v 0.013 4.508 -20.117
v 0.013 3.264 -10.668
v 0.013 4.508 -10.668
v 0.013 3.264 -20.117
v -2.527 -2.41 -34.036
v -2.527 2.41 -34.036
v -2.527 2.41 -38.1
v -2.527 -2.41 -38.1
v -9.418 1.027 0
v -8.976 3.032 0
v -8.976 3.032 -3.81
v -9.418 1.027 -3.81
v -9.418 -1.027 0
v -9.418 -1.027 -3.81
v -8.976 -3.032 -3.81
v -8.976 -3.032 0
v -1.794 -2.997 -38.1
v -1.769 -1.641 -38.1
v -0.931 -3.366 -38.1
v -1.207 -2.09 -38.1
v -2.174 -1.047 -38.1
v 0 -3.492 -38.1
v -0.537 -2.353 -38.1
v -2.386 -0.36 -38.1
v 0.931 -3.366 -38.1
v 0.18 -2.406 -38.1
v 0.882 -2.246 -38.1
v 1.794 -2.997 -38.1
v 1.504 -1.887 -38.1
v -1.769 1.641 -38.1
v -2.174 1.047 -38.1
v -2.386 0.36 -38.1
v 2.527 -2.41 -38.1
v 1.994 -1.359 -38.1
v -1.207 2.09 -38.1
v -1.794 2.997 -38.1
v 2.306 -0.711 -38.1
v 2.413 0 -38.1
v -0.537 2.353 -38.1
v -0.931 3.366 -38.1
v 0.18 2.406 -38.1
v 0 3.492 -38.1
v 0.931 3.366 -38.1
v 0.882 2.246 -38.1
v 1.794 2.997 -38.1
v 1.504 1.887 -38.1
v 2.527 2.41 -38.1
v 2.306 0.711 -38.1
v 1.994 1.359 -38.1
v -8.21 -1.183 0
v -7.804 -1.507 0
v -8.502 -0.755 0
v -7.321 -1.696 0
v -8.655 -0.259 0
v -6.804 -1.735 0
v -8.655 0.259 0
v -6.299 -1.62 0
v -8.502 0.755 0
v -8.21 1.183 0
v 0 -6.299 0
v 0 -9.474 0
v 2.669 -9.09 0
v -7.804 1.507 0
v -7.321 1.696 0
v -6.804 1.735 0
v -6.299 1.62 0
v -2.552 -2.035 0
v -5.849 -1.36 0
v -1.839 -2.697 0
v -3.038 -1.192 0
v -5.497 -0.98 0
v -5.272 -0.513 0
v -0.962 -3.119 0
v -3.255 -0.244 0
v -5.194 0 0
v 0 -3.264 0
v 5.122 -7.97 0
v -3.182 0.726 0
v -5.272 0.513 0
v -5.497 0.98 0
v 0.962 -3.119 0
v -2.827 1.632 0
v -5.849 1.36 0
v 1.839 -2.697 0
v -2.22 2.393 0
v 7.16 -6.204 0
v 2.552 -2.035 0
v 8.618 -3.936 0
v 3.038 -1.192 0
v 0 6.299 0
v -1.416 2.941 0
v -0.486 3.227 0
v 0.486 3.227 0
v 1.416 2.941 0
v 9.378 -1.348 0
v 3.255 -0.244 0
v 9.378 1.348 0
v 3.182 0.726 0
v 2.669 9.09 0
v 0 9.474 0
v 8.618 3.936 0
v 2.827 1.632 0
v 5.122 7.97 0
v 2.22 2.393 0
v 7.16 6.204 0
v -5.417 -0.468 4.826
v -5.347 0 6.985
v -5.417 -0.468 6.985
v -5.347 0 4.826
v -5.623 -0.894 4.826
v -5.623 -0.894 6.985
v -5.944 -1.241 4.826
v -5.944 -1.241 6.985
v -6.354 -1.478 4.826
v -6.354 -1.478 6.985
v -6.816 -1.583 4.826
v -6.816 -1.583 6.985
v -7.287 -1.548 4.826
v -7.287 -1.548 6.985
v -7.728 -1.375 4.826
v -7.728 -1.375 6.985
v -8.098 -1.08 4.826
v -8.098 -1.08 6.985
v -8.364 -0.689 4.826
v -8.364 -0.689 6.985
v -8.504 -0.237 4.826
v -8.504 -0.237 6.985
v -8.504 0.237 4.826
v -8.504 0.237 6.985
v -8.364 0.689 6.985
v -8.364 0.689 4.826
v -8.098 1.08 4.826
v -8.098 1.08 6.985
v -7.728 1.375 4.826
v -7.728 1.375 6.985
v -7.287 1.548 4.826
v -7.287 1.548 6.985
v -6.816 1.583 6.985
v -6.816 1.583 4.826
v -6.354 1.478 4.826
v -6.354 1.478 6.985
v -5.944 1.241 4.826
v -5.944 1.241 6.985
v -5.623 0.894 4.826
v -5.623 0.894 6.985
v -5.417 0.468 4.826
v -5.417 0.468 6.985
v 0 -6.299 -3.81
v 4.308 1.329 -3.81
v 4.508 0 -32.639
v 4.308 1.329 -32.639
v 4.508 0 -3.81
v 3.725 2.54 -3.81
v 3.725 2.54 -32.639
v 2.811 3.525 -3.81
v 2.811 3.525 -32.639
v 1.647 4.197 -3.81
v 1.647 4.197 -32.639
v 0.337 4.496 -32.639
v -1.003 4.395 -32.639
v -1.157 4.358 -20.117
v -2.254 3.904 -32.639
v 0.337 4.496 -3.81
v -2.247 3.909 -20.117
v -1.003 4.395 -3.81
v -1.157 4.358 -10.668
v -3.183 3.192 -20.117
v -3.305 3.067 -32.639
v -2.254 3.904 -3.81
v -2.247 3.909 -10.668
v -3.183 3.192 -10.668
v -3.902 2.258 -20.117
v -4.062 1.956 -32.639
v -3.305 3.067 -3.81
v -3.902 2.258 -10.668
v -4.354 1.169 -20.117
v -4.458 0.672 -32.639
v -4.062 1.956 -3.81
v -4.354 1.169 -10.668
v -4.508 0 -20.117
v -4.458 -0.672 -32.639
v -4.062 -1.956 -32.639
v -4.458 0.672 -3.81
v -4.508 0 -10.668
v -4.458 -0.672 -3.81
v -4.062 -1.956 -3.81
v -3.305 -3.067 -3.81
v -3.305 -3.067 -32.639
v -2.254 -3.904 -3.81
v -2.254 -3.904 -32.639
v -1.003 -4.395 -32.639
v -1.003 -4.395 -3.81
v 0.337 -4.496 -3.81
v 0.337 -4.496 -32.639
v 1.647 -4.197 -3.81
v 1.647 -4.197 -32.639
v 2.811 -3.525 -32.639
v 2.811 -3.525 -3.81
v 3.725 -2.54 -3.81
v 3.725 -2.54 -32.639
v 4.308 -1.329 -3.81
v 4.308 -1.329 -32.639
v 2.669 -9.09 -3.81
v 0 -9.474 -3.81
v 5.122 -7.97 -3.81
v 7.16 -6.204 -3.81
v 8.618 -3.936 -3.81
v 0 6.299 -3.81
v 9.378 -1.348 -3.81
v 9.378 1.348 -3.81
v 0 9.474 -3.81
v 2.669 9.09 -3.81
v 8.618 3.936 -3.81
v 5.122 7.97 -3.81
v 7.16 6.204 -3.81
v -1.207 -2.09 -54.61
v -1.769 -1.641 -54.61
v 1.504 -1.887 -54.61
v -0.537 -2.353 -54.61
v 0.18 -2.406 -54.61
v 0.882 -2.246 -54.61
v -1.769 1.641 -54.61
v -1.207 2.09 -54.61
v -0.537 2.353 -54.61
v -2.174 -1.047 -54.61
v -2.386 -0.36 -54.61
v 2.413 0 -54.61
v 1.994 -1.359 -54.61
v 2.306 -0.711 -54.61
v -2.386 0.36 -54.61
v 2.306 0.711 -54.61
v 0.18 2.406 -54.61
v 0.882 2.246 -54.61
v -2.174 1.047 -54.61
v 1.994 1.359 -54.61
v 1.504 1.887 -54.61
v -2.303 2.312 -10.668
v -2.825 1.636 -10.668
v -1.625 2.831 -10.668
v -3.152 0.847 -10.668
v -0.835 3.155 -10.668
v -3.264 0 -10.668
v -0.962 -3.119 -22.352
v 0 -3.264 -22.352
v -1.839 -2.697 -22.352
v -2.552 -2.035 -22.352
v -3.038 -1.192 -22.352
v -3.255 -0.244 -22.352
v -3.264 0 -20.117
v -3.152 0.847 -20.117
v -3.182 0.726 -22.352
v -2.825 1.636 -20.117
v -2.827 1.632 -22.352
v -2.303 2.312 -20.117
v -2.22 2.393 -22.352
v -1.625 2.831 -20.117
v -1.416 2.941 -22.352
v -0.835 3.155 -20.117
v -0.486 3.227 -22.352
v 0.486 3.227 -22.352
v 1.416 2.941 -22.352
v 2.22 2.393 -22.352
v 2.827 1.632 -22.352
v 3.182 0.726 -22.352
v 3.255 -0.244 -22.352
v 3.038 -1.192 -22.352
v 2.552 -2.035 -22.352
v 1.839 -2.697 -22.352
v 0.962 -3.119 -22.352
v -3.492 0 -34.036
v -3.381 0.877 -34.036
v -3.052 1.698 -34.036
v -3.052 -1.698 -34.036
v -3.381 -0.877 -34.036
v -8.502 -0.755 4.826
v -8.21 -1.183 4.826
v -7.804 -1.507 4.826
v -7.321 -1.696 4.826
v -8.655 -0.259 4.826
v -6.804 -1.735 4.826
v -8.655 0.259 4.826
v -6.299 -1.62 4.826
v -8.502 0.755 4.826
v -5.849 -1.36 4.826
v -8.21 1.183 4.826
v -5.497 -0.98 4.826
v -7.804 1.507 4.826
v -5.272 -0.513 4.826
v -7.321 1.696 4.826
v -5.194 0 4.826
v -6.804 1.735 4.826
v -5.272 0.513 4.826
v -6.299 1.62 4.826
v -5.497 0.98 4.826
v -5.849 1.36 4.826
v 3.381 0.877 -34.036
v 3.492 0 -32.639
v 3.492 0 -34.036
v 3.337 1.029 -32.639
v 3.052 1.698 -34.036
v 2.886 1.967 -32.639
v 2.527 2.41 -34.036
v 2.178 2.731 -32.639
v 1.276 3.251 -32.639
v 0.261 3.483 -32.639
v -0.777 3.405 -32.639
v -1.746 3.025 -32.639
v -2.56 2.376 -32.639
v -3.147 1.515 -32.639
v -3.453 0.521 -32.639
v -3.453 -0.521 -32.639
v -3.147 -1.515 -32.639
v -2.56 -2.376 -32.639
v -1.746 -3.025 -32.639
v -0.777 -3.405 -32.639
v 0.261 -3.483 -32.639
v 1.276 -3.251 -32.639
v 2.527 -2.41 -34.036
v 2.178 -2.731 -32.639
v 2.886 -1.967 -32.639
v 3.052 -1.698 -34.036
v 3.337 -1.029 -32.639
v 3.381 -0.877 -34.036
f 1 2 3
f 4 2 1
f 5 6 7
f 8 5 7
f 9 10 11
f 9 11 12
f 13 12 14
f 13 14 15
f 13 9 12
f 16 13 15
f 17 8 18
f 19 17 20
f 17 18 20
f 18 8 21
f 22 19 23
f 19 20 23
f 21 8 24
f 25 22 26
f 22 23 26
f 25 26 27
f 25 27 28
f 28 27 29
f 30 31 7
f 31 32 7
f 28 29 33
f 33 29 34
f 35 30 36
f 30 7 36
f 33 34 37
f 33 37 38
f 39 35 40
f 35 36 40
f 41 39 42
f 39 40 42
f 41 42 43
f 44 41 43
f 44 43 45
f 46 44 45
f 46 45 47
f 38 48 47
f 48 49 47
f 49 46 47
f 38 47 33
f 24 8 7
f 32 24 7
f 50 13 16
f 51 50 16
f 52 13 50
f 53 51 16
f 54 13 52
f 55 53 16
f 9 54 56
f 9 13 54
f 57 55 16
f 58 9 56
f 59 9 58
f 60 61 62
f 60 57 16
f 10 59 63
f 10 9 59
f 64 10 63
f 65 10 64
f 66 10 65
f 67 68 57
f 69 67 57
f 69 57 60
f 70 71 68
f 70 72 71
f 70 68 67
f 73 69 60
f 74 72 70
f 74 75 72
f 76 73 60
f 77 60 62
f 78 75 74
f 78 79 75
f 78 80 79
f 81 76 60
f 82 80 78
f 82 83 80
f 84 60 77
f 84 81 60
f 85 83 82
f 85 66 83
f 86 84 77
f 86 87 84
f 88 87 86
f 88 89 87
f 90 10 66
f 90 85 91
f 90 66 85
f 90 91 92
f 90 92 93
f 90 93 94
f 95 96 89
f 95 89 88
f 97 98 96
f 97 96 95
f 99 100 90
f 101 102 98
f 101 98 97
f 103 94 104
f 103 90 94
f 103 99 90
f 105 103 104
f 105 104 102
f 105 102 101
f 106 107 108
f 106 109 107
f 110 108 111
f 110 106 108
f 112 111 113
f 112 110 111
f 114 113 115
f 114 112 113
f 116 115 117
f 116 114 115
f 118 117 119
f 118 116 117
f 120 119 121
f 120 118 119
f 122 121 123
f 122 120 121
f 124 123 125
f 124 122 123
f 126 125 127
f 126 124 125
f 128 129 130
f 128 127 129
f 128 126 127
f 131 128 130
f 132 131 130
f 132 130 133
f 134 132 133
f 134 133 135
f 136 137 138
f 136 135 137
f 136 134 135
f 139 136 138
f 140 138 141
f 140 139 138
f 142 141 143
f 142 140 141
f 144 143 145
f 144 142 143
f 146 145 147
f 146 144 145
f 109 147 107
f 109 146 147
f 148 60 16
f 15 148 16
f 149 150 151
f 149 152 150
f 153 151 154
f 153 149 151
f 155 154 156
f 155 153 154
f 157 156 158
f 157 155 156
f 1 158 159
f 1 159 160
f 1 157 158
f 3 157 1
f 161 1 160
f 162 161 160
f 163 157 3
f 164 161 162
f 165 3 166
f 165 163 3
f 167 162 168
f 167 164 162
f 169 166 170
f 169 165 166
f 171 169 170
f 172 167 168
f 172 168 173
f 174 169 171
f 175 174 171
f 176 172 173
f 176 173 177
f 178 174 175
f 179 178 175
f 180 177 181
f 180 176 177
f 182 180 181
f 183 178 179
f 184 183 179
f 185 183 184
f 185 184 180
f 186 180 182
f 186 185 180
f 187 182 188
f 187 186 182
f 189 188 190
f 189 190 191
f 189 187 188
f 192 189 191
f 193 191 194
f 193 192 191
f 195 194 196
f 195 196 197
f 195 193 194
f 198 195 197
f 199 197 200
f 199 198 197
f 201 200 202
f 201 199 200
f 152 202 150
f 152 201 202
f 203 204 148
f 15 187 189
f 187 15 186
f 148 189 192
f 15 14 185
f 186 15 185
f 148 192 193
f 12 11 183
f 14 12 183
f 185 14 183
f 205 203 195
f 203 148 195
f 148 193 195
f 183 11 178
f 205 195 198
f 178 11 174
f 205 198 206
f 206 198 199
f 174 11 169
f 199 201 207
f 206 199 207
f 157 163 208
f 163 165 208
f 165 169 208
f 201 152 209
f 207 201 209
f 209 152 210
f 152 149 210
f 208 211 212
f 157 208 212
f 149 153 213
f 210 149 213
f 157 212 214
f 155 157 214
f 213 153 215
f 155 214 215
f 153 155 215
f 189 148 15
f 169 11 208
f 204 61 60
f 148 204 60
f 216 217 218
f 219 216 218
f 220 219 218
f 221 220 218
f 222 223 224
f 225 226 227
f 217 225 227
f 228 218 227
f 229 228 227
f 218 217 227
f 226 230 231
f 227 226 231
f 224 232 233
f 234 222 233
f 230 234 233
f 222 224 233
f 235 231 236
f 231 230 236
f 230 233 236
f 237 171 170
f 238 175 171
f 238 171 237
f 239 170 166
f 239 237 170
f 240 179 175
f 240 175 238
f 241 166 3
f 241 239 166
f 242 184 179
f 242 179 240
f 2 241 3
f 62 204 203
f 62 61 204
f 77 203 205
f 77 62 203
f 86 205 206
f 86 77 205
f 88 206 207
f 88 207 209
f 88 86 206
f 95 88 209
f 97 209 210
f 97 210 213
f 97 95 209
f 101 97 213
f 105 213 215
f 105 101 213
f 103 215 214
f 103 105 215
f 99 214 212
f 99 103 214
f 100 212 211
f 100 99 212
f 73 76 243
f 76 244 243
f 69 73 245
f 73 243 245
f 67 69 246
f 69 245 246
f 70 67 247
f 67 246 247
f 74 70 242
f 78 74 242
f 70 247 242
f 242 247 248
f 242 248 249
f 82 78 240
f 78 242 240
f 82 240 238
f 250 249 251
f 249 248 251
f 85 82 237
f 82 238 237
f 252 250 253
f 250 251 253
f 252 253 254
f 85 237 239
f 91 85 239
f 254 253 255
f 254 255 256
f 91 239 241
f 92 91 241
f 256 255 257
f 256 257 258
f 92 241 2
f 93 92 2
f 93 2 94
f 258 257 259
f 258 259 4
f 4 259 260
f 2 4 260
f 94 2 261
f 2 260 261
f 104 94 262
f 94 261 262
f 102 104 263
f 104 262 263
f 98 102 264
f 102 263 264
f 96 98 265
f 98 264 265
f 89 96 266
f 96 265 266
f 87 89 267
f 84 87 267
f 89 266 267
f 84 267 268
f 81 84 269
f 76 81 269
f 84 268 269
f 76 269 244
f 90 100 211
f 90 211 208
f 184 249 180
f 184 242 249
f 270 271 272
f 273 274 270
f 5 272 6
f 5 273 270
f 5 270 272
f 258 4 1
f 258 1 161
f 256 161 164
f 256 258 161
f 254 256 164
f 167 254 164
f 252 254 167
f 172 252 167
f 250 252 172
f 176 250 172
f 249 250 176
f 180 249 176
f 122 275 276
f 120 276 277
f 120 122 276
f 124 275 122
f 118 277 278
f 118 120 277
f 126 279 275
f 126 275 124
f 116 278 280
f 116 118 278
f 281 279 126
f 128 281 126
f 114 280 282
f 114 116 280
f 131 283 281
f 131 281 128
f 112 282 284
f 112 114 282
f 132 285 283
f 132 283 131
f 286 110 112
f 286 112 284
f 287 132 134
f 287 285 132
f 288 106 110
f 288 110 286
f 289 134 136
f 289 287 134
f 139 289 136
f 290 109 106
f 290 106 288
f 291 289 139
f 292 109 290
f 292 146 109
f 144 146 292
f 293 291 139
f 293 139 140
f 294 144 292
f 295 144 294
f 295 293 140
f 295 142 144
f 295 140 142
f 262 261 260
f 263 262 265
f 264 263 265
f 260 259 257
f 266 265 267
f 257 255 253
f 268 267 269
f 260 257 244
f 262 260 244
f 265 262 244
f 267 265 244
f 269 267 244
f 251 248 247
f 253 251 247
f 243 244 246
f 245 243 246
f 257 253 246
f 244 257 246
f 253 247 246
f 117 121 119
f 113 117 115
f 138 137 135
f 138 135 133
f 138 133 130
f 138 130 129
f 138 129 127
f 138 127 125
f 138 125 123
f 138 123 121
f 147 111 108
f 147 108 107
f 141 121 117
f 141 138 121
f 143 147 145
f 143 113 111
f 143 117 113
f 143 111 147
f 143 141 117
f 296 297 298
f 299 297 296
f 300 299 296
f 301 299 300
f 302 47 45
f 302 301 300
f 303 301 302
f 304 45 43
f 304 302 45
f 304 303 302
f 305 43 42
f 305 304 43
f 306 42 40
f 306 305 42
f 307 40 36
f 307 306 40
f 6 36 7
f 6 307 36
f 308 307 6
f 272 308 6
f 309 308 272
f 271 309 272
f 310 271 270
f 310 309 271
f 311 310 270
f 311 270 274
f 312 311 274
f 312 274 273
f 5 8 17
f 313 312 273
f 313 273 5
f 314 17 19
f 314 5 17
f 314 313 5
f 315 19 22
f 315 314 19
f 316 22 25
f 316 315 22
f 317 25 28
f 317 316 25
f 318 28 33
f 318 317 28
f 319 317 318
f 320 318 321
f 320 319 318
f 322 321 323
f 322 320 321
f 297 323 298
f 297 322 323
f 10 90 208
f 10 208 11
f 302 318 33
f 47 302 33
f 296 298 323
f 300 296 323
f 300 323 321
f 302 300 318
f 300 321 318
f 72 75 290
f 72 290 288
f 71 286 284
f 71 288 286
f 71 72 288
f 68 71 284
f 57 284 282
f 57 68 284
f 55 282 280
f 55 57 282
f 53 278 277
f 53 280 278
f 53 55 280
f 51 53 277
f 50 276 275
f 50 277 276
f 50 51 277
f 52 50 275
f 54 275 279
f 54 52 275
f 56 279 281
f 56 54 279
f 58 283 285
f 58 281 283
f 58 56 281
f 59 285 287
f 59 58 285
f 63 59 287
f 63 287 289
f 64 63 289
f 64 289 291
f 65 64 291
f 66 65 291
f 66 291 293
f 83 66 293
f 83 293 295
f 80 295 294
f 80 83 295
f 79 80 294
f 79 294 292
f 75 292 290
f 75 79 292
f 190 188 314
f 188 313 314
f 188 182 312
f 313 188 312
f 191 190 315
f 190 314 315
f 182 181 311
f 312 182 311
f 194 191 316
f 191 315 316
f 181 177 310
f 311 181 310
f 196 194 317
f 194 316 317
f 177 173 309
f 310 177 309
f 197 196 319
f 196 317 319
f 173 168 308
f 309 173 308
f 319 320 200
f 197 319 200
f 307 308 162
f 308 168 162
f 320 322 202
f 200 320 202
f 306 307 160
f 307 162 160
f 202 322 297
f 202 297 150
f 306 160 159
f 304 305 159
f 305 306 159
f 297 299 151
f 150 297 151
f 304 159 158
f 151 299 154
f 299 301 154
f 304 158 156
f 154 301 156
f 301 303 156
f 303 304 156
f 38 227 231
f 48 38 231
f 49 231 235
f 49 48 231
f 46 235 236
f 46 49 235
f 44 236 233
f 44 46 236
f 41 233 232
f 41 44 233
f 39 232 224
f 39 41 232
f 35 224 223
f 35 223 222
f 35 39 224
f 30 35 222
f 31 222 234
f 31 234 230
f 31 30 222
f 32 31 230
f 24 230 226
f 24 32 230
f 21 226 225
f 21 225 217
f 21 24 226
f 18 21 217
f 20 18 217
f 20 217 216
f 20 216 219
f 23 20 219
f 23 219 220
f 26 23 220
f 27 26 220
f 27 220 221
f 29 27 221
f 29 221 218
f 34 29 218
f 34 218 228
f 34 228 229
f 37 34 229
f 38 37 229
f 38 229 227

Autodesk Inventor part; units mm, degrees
ref_plane "YZ Plane" through (0, 0, 0) normal (1, 0, 0) x (0, 1, 0)
ref_plane "XZ Plane" through (0, 0, 0) normal (0, 1, 0) x (-1, 0, 0)
ref_plane "XY Plane" through (0, 0, 0) normal (0, 0, 1) x (1, 0, 0)
sketch "Sketch1" plane through (0, 0, 0) normal (0, 0, 1) x (1, 0, 0)
  circle A0 centre (0, 0) radius 9.4742
  dimension "d0" = 18.9484
extrude "Extrusion1" add sketch "Sketch1" against normal blind 3.81
sketch "Sketch2" plane through (0, 0, 0) normal (0, 0, 1) x (1, 0, 0)
  circle A0 centre (0, 0) radius 4.5085
  dimension "d3" = 9.017
extrude "Extrusion2" add sketch "Sketch2" against normal blind 32.639
sketch "Sketch3" plane through (0, 0, 0) normal (0, 0, 1) x (1, 0, 0)
  circle A0 centre (0, 0) radius 3.4925
  dimension "d6" = 6.985
extrude "Extrusion3" add sketch "Sketch3" against normal blind 38.1
sketch "Sketch4" plane through (0, 0, 0) normal (0, 0, 1) x (1, 0, 0)
  circle A0 centre (0, 0) radius 2.413
  dimension "d9" = 4.826
extrude "Extrusion4" add sketch "Sketch4" against normal blind 54.61
sketch "Sketch6" plane through (0, 0, 0) normal (0, 0, 1) x (1, 0, 0)
  circle A0 centre (0, 0) radius 9.4742 projected
hole "Hole1" at (0, 0, 0) direction (0, 0, -1) diameter 6.5278 depth 22.352
sketch "Sketch5" plane through (0, 0, 0) normal (0, 1, 0) x (-1, 0, 0)
  line L0 (-4.5085, -32.639) -> (4.5085, -32.639) projected
  line L1 (4.5085, -3.81) -> (-4.5085, -3.81) projected
  line L2 (-3.4925, -38.1) -> (3.4925, -38.1) projected
  line L3 (3.4925, -32.639) -> (-3.4925, -32.639) projected
  line L4 (-3.4925, -32.639) -> (-3.4925, -38.1) projected
  line L5 (-2.413, -38.1) -> (-2.413, -54.61) projected
  line L6 (3.4925, -32.639) -> (3.4925, -38.1) projected
  line L7 (4.5085, -3.81) -> (4.5085, -32.639) projected
  line L8 (-4.5085, -3.81) -> (-4.5085, -32.639) projected
  line L9 (9.4742, 0) -> (9.4742, -3.81) projected
  line L10 (-9.4742, -3.81) -> (9.4742, -3.81) projected
  line L11 (-9.4742, 0) -> (9.4742, 0) projected
  line L12 (-9.4742, 0) -> (-9.4742, -3.81) projected
  line L13 (2.413, -38.1) -> (2.413, -54.61) projected
  line L14 (-2.413, -54.61) -> (2.413, -54.61) projected
  line L15 (-3.4925, -32.639) -> (-3.4925, -34.036) construction
  line L16 (-3.4925, -38.1) -> (3.4925, -38.1) projected
  line L17 (-3.4925, -34.036) -> (-2.5273, -34.036)
  line L18 (-2.5273, -34.036) -> (-2.5273, -38.1)
  line L19 (-2.5273, -38.1) -> (-3.4925, -38.1)
  line L20 (-3.4925, -38.1) -> (-3.4925, -34.036)
  line L21 (3.4925, -34.036) -> (2.5273, -34.036)
  line L22 (2.5273, -34.036) -> (2.5273, -38.1)
  line L23 (2.5273, -38.1) -> (3.4925, -38.1)
  line L24 (3.4925, -38.1) -> (3.4925, -34.036)
  point P0 (0, 0)
  dimension "d12" = 1.397
  dimension "d13" = 0.9652
  dimension "d14" = 0.9652
extrude "Extrusion5" cut sketch "Sketch5" along normal through all both and the other way through all contours L17 L18 L2 L4 | L6 L2 L22 L21
sketch "Sketch7" plane through (0, 0, 0) normal (0, 1, 0) x (-1, 0, 0)
  line L0 (-9.4742, 0) -> (9.4742, 0) projected
  line L1 (9.4742, 0) -> (9.4742, -3.81) projected
  line L2 (4.5085, -3.81) -> (4.5085, -32.639) projected
  line L3 (3.2639, -22.352) -> (3.2639, 0) projected
  line L4 (-3.2639, -22.352) -> (-3.2639, 0) projected
  line L5 (3.2639, -22.352) -> (-3.2639, -22.352) projected
  line L6 (-4.5085, -3.81) -> (-4.5085, -32.639) projected
  line L7 (-9.4742, 0) -> (-9.4742, -3.81) projected
  line L8 (3.4925, -32.639) -> (3.4925, -34.036) projected
  line L9 (3.4925, -34.036) -> (2.5273, -34.036) projected
  line L10 (2.5273, -38.1) -> (2.5273, -34.036) projected
  line L11 (2.413, -38.1) -> (2.413, -54.61) projected
  line L12 (-2.413, -38.1) -> (-2.413, -54.61) projected
  line L13 (-2.5273, -34.036) -> (-2.5273, -38.1) projected
  line L14 (-3.4925, -32.639) -> (-3.4925, -34.036) projected
  line L15 (9.4742, 0) -> (9.4742, -10.668)
  line L16 (4.5085, -10.668) -> (-0.0127, -10.668)
  line L17 (-0.0127, -10.668) -> (-0.0127, -20.1168)
  line L18 (-0.0127, -20.1168) -> (4.5085, -20.1168)
  line L19 (4.5085, -20.1168) -> (4.5085, -10.668)
  point P0 (0, 0)
  dimension "d26" = 10.668
  dimension "d27" = 9.4488
  dimension "d42" = 4.5212
extrude "Extrusion6" cut sketch "Sketch7" along normal through all contours L16 L2 L18 L3 | L3 L18 L17 L16
sketch "Sketch9" plane through (0, 0, 0) normal (0, 0, 1) x (1, 0, 0)
  line L0 (0, 0) -> (-6.9342, 0)
  circle A0 centre (-6.9342, 0) radius 1.7399
  dimension "d35" = 6.9342
  dimension "d36" = 3.4798
extrude "Extrusion8" add sketch "Sketch9" along normal blind 4.826
sketch "Sketch10" plane through (-6.9342, 0, 4.826) normal (0, 0, 1) x (1, 0, 0)
  circle A0 centre (0, 0) radius 1.5875
  point P0 (6.9342, 0)
  dimension "d39" = 3.175
extrude "Extrusion9" add sketch "Sketch10" along normal blind 2.159
sketch "Sketch8" plane through (0, 0, 0) normal (0, 0, 1) x (1, 0, 0)
  circle A0 centre (0, 0) radius 9.4742 projected
  line L0 (0, -9.4742) -> (0, -6.2992)
  line L1 (0, -6.2992) -> (-8.9758, -3.0323)
  line L2 (0, 9.4742) -> (0, 6.2992)
  line L3 (0, 6.2992) -> (-8.9758, 3.0323)
  dimension "d30" = 3.175
  dimension "d31" = 110
  dimension "d32" = 3.175
extrude "Extrusion7" cut sketch "Sketch8" against normal through all contours L2 L3 A0 | A0 L1 L0
thread "Thread1" size "10-24 UNC" class "2A" standard "ANSI Unified Screw Threads" length 13.97
properties part number "CrankShaft"
